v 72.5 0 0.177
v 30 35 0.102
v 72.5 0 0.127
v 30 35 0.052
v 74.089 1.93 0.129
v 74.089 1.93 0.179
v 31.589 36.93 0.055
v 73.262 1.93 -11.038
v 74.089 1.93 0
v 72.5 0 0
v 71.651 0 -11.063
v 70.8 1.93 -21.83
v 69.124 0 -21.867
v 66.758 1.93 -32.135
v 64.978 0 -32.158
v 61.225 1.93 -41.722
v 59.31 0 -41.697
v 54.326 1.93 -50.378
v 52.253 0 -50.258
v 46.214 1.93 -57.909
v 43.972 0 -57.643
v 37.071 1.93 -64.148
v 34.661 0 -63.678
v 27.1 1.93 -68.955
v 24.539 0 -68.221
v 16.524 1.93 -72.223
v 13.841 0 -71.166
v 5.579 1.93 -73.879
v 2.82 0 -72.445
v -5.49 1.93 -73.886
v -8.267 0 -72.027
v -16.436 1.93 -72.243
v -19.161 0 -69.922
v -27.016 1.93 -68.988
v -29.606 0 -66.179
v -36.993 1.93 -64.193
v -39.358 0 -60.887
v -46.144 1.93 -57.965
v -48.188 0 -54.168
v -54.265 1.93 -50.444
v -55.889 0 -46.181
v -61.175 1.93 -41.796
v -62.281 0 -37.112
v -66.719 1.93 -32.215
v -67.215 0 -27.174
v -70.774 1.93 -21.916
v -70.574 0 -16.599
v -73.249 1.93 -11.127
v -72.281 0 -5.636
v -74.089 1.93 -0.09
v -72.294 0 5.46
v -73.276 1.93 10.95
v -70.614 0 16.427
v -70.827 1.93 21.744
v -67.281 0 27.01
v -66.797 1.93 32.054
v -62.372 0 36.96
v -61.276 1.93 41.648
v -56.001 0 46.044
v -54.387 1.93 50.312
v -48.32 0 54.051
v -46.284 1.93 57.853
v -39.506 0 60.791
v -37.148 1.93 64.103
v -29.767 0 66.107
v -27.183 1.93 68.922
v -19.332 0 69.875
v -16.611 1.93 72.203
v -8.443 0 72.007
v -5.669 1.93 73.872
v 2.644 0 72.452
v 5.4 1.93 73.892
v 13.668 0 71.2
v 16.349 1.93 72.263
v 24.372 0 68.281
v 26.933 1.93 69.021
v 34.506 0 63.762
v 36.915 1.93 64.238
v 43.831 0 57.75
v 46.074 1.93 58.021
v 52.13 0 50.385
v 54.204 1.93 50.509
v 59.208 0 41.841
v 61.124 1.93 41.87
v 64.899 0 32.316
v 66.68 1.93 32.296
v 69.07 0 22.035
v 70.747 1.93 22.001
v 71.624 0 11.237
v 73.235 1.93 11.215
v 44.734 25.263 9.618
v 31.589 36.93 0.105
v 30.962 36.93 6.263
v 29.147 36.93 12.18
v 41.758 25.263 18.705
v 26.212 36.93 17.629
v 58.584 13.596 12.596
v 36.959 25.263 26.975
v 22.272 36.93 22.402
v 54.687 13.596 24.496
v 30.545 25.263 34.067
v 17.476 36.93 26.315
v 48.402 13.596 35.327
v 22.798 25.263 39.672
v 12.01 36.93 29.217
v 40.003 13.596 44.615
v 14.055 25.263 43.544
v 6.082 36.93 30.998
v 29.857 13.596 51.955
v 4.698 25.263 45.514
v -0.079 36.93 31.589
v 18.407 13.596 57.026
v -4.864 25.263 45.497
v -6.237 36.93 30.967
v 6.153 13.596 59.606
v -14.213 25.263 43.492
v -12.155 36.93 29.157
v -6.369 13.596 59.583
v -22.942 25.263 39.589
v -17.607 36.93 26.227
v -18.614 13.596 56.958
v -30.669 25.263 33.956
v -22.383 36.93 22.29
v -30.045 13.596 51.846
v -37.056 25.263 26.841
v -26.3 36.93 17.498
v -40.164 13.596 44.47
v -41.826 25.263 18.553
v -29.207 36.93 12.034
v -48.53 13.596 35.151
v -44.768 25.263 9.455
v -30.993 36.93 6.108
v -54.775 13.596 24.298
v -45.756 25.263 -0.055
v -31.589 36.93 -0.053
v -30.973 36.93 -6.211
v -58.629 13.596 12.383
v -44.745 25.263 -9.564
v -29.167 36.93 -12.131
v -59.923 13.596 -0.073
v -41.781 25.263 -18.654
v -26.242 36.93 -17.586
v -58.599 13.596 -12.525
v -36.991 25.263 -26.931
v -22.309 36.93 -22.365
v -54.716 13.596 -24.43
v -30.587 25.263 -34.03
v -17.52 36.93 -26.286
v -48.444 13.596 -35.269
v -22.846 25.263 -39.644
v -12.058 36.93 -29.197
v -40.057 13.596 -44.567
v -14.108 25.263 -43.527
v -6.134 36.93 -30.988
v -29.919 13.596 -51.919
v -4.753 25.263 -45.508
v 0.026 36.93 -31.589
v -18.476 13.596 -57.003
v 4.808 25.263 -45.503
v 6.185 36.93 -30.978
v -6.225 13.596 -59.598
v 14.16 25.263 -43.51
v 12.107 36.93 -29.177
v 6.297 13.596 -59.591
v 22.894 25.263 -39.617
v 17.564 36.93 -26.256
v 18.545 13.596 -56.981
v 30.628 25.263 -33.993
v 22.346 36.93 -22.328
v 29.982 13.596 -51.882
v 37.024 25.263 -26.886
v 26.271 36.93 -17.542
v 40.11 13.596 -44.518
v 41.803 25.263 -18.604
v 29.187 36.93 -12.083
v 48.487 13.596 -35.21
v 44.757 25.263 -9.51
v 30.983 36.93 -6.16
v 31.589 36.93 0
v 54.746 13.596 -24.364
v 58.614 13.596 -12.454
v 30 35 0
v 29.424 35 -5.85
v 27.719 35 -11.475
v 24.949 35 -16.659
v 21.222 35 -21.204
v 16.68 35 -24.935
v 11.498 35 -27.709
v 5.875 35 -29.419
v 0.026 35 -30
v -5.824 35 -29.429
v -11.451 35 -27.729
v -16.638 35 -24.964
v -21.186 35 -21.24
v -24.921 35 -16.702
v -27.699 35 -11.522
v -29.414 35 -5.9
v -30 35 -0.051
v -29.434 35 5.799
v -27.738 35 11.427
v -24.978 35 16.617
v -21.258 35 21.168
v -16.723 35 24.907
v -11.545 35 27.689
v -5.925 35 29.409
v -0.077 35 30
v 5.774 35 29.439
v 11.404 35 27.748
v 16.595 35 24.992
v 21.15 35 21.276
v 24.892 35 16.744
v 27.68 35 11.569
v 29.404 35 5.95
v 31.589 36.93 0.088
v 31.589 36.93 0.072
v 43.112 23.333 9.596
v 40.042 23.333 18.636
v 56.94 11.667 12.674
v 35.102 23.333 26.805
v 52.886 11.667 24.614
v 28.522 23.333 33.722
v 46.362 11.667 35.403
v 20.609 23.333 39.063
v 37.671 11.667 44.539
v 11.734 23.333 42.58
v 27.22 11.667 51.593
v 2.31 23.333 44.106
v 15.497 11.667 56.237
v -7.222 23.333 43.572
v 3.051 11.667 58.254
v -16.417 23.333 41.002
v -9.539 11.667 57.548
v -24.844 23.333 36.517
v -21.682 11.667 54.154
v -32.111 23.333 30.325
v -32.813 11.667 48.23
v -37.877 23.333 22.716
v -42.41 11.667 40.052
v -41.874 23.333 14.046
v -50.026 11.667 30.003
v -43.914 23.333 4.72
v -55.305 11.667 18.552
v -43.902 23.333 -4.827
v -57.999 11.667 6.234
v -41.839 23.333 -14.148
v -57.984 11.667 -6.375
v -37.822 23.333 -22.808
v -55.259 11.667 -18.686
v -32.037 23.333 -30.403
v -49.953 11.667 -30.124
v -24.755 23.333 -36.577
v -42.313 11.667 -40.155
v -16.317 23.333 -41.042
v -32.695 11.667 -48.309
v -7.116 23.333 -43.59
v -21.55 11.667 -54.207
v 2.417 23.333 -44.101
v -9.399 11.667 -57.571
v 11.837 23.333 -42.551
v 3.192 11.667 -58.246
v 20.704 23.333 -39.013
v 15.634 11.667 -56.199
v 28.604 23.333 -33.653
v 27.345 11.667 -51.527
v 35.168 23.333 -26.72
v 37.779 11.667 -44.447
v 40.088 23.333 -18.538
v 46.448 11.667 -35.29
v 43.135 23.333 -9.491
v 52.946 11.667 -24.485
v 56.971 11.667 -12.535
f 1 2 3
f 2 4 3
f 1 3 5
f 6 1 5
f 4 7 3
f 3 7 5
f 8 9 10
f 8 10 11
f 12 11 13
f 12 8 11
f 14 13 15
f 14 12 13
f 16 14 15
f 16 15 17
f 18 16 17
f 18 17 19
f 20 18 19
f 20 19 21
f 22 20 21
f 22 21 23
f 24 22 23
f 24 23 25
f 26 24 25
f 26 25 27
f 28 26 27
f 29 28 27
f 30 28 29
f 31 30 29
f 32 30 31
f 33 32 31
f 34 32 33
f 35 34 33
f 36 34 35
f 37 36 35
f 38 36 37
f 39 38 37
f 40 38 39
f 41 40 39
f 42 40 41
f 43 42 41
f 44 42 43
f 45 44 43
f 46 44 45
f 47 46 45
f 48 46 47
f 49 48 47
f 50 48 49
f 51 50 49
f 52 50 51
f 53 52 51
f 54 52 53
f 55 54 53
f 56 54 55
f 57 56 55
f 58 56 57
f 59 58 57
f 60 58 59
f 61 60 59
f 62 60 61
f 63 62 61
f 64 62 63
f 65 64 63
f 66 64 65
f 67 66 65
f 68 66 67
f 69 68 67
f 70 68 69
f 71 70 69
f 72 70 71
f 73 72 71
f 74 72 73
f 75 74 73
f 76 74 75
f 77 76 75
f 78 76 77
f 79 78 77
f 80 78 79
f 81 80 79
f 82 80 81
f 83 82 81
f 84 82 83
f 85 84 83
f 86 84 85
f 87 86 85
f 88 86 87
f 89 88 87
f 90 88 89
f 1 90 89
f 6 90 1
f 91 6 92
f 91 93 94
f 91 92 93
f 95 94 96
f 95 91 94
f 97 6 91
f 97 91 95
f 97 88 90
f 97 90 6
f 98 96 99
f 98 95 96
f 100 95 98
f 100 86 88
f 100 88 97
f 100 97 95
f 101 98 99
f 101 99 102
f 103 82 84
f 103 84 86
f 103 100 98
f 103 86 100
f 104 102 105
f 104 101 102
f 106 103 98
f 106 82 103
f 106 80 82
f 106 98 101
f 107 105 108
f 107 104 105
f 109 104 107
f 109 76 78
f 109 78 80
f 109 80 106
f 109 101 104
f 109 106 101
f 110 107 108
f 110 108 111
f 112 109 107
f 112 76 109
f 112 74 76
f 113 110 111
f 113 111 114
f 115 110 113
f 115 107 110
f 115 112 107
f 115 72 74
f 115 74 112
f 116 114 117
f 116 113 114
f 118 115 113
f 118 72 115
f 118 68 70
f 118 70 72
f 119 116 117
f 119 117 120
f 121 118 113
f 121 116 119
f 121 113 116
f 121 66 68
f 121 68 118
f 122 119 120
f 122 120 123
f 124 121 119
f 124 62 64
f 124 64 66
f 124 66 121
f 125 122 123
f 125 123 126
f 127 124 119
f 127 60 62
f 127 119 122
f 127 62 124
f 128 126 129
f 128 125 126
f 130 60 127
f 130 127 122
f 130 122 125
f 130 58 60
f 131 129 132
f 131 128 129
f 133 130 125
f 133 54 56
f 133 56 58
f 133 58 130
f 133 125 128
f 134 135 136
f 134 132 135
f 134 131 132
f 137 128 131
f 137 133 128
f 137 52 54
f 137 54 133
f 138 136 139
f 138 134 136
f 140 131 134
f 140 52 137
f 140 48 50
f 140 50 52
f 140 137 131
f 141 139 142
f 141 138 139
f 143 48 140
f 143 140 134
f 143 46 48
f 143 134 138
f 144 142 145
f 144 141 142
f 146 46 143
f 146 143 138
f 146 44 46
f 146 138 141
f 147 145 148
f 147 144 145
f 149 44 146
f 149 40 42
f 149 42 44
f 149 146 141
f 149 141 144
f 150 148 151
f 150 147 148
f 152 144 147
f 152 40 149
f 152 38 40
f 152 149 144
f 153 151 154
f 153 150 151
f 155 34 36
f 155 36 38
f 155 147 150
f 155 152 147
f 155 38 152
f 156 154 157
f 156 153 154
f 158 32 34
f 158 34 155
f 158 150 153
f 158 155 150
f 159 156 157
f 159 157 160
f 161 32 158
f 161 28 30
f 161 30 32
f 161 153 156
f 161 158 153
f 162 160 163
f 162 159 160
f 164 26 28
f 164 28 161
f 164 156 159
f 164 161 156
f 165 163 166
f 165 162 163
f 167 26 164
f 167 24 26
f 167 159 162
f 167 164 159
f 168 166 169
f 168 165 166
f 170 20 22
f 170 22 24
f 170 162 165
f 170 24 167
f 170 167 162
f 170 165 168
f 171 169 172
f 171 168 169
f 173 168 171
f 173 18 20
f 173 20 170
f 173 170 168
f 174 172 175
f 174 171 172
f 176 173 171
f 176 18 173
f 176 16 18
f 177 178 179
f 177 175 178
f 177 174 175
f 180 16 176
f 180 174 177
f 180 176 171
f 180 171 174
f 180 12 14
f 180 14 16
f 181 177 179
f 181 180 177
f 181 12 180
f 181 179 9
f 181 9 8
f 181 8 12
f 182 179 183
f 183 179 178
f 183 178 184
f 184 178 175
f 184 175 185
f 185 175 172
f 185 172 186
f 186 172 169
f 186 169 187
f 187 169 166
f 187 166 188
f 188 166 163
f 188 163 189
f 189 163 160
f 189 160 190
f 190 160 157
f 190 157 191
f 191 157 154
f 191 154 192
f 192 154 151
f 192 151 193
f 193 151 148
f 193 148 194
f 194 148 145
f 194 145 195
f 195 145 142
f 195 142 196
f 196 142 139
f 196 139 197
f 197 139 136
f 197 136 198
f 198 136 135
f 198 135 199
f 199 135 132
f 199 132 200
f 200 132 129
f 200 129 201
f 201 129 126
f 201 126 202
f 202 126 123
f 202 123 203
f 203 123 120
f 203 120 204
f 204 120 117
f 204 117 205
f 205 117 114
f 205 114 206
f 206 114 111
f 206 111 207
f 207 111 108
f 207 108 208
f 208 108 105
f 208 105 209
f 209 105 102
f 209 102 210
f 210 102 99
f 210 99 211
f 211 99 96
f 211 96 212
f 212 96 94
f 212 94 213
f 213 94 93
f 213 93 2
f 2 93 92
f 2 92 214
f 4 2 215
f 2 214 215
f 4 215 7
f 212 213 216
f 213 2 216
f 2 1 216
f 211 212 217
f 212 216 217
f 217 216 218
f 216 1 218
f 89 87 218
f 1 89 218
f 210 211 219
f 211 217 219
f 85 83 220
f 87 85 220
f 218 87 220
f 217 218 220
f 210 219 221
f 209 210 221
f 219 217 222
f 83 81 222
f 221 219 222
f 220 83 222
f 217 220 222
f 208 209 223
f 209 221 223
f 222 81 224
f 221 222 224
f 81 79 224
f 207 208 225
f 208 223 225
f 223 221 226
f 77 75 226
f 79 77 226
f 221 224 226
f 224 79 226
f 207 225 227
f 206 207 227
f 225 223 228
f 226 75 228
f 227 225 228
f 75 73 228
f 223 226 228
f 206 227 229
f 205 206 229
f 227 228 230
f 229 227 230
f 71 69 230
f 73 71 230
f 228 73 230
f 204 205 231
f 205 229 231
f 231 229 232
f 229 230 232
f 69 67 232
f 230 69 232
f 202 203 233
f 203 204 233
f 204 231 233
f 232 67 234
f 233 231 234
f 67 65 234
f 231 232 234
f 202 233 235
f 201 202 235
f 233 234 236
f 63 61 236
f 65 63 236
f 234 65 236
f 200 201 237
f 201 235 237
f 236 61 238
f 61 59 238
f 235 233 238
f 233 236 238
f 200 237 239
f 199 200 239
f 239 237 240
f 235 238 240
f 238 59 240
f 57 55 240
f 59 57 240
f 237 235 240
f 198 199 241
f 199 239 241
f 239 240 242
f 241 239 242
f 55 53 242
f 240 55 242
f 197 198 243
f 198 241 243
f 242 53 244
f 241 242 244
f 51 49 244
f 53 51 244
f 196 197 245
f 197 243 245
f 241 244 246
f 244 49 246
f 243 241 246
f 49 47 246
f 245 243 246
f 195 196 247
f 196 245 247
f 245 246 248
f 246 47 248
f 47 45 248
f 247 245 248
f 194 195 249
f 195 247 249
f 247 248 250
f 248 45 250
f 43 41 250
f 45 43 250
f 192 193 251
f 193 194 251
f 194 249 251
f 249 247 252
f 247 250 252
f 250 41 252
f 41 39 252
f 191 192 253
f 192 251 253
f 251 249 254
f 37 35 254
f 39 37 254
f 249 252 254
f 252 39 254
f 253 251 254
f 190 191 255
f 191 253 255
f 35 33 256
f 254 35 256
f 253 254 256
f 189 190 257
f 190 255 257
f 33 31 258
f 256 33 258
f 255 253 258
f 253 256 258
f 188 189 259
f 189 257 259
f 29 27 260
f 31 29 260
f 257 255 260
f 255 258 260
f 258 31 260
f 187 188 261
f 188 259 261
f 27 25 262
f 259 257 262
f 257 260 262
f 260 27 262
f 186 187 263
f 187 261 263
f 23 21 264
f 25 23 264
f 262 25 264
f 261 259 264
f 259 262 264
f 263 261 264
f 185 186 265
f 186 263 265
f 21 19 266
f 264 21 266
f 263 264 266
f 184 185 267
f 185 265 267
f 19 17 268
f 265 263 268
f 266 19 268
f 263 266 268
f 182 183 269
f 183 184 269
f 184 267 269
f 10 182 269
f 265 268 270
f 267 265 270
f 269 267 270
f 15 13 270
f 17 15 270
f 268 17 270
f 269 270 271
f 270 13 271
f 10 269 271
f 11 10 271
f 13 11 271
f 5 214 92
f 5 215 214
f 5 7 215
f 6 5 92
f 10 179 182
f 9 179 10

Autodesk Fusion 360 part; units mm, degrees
sketch "スケッチ1" plane through (0, 0, 0) normal (0, 0, 1) x (1, 0, 0)
  line L0 (0, 0) -> (72.5, 0)
  line L1 (0, 0) -> (0, 35)
  line L2 (0, 35) -> (30, 35)
  line L3 (30, 35) -> (72.5, 0)
  line L4 (72.5, 0) -> (74.0893, 1.9298)
  line L5 (74.0893, 1.9298) -> (31.5893, 36.9298)
  line L6 (31.5893, 36.9298) -> (30, 35)
  line L7 (31.5893, 36.9298) -> (0, 36.9298)
  line L8 (31.5893, 36.9298) -> (-4, 42)
  line L9 (31.5893, 36.9298) -> (74.0893, 1.9298)
  line L10 (31.5893, 36.9298) -> (90.0627, 19.4298)
  line L11 (0, 0) -> (0, -10)
  line L12 (0, -10) -> (105, -10)
  line L13 (74.0893, 1.9298) -> (88.5755, -10)
  line L14 (72.5, 0) -> (84.6429, -10)
  dimension "d1" = 72.5
  dimension "d2" = 35
  dimension "d3" = 30
  dimension "d4" = 2.5
  dimension "d5" = 10
revolve "回転1" add sketch "スケッチ1" angle 359.9 about axis through (0, 0, 0) along (0, -1, 0) contours L3 L4 L5 L6 L9
extrude "押し出し1" add 1 faces at (45.2261, 24.6199, -0.0789) along direction (0.001745, 0, 0.999998) blind 0.05
